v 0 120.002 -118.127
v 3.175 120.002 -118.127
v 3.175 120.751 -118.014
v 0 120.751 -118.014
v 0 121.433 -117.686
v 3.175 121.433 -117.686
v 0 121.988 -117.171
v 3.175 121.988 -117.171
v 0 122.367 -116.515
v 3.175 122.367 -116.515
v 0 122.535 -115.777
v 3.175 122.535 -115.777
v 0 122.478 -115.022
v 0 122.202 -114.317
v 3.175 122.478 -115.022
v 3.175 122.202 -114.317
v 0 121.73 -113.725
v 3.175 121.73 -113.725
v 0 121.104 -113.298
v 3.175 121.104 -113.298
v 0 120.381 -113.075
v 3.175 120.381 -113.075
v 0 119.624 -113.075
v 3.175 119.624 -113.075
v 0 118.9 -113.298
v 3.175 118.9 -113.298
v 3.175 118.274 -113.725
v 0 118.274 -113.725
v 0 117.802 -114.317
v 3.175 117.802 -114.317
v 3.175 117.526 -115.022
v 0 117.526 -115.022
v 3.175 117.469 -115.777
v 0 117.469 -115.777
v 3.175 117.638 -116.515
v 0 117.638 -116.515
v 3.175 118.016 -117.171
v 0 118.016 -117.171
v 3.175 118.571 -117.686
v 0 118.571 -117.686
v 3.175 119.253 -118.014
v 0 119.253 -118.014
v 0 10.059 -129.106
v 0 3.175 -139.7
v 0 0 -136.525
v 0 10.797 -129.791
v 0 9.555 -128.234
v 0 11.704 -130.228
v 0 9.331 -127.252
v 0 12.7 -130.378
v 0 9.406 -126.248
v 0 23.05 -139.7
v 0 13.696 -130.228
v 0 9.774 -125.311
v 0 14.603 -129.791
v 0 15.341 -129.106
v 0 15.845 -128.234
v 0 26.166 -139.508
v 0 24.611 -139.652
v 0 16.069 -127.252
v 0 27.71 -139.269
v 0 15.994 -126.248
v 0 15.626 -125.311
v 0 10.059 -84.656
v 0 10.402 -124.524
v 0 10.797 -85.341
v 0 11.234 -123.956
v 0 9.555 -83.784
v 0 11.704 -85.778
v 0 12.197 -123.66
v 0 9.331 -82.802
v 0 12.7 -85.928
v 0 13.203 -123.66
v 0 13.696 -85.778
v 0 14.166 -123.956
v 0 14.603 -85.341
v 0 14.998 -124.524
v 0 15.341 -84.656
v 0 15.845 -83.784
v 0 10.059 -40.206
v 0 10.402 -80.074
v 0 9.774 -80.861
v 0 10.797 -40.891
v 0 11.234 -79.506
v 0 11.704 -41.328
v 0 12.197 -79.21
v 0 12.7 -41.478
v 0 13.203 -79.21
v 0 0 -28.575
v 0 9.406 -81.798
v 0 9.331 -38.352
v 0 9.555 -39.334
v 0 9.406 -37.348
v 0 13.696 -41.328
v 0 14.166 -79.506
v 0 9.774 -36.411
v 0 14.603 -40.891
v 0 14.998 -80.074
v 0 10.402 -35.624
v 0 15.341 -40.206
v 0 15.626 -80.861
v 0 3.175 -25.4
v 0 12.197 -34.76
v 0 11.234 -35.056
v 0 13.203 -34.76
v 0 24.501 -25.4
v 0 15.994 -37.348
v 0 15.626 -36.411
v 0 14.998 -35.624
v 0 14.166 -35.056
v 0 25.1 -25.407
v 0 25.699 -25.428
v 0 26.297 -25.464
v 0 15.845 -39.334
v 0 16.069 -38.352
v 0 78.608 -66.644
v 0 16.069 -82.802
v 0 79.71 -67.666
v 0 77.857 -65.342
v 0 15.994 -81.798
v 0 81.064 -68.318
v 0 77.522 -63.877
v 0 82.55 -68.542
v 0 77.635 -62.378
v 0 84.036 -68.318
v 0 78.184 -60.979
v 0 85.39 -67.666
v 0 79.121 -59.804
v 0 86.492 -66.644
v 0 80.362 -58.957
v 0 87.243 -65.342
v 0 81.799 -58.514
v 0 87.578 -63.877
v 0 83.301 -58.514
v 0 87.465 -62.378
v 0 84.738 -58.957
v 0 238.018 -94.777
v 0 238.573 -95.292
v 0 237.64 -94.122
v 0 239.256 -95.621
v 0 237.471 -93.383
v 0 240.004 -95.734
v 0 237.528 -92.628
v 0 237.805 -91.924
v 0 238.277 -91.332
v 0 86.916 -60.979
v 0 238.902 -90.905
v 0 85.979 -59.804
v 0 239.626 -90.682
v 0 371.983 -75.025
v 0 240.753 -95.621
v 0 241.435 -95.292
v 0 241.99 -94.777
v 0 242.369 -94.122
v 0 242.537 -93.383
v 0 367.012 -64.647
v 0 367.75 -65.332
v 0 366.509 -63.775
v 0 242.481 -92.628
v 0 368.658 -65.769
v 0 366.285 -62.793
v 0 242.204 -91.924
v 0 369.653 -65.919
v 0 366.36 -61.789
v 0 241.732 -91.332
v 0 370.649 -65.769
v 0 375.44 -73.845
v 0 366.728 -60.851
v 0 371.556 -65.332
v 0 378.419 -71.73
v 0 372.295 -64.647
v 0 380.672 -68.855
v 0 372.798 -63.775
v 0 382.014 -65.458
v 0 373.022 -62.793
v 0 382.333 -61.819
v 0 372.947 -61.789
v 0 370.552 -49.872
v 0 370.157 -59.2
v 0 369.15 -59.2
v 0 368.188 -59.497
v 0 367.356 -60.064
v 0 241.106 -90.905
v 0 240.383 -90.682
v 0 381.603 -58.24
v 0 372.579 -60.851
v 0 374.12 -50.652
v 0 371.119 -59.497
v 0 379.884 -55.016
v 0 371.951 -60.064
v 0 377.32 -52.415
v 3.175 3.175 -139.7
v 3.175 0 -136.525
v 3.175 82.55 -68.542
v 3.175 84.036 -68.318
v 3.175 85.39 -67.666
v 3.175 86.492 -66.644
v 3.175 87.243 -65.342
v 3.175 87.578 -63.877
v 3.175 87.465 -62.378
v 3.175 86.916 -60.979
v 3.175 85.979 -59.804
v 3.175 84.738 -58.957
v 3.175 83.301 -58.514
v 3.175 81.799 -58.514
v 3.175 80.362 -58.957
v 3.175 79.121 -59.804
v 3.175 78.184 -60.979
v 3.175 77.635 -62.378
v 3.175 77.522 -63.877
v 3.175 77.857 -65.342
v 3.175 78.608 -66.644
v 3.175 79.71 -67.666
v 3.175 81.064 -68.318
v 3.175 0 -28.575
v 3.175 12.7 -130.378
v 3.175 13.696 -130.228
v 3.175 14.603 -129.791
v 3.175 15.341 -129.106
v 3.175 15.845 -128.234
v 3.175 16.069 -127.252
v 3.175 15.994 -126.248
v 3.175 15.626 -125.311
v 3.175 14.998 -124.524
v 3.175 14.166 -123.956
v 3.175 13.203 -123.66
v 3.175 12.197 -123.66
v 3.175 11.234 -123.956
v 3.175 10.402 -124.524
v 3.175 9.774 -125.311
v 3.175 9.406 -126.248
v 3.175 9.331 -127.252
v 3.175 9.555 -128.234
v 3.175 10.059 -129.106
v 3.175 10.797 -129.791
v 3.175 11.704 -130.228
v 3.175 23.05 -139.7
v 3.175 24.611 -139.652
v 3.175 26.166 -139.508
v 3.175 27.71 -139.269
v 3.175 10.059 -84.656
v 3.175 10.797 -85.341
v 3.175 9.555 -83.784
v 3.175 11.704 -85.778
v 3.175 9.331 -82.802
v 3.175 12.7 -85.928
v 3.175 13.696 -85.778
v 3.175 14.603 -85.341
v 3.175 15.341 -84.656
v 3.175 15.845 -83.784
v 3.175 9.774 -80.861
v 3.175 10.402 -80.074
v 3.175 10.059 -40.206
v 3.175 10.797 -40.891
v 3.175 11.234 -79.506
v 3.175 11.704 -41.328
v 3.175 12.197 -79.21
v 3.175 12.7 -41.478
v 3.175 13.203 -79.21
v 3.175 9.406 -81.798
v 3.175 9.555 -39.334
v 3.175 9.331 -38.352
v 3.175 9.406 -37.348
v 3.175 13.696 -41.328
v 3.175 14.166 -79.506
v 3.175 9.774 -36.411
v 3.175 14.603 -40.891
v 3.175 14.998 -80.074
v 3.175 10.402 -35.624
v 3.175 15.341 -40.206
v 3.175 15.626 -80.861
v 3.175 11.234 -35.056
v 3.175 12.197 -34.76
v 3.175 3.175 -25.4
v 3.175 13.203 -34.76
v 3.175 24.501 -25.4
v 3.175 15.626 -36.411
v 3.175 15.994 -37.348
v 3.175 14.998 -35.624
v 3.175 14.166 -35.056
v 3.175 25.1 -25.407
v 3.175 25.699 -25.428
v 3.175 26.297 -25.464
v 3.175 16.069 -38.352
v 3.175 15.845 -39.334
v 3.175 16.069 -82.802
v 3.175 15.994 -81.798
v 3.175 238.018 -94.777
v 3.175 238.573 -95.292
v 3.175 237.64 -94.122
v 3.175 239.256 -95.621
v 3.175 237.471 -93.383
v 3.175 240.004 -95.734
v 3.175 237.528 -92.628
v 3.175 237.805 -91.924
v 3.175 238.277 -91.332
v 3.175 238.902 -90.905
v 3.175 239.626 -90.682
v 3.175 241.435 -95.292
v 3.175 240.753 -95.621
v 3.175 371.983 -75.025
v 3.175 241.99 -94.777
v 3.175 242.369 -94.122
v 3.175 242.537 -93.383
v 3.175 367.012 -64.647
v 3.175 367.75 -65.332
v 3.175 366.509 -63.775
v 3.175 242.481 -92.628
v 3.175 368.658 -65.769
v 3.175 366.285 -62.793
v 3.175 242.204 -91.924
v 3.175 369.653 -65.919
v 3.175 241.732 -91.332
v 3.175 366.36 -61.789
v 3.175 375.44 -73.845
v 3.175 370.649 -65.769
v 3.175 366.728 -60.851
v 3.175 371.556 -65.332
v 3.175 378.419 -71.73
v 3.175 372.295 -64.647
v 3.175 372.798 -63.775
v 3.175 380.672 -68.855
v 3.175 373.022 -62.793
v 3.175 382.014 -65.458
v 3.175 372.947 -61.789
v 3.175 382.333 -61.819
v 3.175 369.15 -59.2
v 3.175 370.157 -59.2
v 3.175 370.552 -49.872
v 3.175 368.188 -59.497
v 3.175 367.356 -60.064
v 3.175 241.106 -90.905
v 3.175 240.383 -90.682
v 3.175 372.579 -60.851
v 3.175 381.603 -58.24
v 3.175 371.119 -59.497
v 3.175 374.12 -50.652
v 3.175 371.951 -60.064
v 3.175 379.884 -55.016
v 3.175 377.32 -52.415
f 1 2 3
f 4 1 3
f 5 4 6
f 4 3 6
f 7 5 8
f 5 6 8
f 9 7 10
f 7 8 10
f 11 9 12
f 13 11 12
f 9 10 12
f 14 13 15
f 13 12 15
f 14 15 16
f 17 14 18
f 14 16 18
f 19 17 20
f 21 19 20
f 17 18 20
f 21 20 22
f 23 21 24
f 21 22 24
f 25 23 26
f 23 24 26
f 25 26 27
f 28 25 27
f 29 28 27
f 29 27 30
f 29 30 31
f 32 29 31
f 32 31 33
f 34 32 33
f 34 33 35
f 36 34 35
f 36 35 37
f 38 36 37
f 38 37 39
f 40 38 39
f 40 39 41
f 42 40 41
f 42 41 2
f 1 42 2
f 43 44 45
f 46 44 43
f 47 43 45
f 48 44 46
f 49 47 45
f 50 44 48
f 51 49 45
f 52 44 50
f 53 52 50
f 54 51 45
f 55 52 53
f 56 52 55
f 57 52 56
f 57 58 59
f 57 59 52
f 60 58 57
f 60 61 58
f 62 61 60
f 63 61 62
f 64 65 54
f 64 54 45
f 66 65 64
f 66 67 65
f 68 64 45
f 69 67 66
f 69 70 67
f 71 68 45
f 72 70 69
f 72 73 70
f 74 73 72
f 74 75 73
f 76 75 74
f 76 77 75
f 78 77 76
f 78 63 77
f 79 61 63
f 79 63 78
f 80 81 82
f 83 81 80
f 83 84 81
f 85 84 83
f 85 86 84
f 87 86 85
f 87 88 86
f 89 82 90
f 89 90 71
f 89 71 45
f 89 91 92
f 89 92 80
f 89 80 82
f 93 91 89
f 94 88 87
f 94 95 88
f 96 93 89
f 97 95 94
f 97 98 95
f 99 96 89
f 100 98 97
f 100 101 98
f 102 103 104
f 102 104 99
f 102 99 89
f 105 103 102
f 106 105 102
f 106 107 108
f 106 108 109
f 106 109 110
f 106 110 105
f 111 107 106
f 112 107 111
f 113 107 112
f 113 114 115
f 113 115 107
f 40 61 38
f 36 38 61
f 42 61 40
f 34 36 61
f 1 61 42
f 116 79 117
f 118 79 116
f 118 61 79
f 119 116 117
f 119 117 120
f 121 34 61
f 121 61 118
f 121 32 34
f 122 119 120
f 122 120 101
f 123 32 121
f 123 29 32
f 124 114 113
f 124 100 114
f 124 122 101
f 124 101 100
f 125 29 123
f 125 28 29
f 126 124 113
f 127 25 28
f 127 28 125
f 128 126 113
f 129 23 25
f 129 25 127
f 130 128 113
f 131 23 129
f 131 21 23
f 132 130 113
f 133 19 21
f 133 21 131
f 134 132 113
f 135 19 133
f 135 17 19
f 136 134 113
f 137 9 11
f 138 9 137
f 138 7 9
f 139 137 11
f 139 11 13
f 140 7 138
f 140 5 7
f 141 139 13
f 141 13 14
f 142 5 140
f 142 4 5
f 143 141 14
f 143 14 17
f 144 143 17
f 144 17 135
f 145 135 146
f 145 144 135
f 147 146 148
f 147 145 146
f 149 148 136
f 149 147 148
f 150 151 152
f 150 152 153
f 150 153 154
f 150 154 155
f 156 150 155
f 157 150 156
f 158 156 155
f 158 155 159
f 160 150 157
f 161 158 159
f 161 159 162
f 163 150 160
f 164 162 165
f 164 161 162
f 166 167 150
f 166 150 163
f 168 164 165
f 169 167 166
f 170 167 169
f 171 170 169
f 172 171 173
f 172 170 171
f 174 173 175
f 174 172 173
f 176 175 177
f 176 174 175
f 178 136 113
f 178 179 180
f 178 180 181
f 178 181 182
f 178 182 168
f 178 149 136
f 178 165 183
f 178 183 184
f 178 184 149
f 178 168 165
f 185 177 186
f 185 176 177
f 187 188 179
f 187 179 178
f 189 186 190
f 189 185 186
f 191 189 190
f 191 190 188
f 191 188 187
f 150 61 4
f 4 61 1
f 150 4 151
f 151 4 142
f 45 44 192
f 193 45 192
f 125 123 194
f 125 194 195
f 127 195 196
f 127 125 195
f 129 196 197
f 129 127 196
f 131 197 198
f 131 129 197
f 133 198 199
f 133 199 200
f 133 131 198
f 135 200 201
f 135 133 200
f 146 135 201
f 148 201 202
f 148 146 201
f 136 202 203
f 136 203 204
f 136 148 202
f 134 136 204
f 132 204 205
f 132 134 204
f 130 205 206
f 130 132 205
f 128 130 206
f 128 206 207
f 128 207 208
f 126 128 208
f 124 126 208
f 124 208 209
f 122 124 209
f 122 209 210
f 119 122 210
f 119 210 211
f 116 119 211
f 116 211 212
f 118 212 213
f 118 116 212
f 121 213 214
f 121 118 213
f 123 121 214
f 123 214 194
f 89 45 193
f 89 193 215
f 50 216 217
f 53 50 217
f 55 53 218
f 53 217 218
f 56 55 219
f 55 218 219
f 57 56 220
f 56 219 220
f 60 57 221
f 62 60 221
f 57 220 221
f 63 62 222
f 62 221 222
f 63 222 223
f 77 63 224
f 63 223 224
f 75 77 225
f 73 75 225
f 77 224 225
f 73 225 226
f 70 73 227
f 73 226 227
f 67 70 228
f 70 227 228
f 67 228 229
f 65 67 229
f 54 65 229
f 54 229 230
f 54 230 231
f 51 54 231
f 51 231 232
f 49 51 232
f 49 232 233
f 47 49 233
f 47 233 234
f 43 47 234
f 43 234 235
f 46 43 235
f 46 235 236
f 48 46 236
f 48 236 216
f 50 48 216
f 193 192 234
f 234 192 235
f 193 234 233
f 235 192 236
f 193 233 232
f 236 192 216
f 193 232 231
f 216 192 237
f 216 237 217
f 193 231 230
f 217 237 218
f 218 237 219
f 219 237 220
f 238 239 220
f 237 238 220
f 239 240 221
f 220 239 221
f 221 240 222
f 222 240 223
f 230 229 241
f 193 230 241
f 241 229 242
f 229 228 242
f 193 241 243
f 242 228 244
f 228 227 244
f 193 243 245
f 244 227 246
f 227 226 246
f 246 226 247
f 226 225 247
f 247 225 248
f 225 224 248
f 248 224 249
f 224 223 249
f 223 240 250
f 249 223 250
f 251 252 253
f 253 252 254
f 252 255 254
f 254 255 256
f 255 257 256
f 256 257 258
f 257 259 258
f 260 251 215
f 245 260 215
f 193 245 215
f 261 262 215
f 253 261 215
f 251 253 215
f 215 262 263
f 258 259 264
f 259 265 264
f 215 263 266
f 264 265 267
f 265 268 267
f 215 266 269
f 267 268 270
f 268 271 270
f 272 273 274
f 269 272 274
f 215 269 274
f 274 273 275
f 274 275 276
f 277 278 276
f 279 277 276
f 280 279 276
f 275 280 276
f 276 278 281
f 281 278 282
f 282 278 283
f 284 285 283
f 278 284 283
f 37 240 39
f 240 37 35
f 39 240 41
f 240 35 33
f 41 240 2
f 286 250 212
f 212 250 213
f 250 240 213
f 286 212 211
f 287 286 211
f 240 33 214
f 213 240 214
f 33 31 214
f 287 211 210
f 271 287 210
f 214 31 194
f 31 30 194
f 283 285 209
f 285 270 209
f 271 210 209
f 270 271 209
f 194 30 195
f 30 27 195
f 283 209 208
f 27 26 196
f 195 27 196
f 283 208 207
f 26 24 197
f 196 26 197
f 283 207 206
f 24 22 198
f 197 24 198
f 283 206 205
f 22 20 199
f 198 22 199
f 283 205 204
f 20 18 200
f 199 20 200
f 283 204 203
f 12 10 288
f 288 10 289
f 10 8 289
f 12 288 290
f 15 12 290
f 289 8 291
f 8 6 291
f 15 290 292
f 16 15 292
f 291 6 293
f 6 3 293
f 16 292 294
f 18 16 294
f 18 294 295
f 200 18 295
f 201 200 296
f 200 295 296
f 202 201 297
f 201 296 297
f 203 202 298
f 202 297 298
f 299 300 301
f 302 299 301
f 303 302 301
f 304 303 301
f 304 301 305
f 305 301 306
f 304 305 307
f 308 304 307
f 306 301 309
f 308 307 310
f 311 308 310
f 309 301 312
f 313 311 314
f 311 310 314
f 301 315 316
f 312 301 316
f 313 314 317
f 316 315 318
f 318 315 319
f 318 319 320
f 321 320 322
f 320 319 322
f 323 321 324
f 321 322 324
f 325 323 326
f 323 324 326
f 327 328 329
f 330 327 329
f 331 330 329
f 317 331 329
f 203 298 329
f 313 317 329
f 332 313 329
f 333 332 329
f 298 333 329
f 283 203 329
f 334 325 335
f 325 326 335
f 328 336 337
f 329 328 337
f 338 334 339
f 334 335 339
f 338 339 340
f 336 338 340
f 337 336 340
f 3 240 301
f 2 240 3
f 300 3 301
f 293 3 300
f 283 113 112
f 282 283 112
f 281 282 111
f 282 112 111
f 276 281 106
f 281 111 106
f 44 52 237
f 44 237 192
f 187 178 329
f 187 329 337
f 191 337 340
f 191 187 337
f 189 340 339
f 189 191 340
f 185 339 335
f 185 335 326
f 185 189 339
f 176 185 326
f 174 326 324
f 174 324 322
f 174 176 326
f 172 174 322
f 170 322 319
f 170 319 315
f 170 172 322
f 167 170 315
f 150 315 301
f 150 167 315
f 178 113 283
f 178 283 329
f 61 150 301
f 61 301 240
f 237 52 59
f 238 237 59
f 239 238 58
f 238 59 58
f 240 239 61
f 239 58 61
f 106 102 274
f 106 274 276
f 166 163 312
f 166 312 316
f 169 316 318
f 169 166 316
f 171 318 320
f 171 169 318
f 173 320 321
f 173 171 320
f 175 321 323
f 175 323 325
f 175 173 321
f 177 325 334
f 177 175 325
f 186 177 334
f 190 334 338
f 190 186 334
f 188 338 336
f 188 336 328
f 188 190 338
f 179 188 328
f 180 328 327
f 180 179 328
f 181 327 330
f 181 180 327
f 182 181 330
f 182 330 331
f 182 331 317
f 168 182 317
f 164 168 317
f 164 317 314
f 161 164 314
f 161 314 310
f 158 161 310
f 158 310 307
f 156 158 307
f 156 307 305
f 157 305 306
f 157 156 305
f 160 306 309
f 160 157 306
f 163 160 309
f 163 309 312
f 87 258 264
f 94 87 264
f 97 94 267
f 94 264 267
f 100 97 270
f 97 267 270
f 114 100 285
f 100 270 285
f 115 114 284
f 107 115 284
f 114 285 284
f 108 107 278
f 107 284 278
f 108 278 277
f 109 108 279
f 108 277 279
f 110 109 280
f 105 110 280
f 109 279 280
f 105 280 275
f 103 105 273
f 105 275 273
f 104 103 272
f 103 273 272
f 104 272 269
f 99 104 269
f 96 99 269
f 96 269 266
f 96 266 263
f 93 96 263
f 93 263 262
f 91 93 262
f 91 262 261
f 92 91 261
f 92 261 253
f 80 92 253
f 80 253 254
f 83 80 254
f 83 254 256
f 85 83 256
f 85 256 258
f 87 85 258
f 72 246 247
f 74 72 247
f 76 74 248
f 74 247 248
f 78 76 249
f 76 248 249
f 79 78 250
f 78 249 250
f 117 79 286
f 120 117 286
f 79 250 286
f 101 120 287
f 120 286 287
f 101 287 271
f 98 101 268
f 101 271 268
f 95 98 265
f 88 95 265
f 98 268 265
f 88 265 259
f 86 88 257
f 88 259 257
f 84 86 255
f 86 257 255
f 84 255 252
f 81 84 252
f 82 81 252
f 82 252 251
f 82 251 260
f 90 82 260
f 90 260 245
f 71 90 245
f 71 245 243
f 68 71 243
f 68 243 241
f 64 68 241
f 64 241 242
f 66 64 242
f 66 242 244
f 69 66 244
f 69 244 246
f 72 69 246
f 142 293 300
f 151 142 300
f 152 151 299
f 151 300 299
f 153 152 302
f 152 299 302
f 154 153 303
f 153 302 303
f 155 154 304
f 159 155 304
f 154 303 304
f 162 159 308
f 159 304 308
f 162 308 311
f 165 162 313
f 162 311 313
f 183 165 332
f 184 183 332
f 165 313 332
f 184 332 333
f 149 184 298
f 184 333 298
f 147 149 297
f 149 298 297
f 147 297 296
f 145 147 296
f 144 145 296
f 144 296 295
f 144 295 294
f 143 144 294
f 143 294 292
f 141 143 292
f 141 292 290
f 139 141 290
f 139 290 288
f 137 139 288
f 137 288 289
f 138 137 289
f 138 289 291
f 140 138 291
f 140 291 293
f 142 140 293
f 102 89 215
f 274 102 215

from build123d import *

# Parameters (mm, degrees)
SKETCH2_R           = 5.0419
SKETCH2_R_2         = 3.3782
BOSS_EXTRUDE2_DEPTH = 3.175
SKETCH3_R           = 3.3782
SKETCH3_R_2         = 2.54
CUT_EXTRUDE1_DEPTH  = 408.087553815
CHAMFER1_SIZE       = 3.175
FILLET1_R           = 25.4


with BuildPart() as part:
    # Sketch2 → Boss-Extrude2 (new body)
    with BuildSketch(Plane(origin=(0, 0, 0), x_dir=(0, 0, -1), z_dir=(1, 0, 0))):
        with BuildLine():
            Line((25.4, 0), (25.4, 25.4))
            Line((25.4, 25.4), (49.872202827, 370.551588468))
            ThreePointArc((49.872202827, 370.551588468), (61.818783569, 382.33286047), (75.02488963, 371.98308153))
            Line((75.02488963, 371.98308153), (139.7, 25.4))
            Line((139.7, 25.4), (139.7, 0))
            Line((139.7, 0), (25.4, 0))
        make_face()
        with Locations((63.5, 82.55)):
            Circle(SKETCH2_R, mode=Mode.SUBTRACT)
        with Locations((62.540399951, 369.653378233)):
            Circle(SKETCH2_R_2, mode=Mode.SUBTRACT)
    extrude(amount=BOSS_EXTRUDE2_DEPTH)

    # Sketch3 → Cut-Extrude1 (cut, through all)
    with BuildSketch(Plane(origin=(3.175, 0, 0), x_dir=(0, 0, -1), z_dir=(1, 0, 0))):
        with Locations((38.1, 12.7)):
            Circle(SKETCH3_R)
        with Locations((82.55, 12.7)):
            Circle(SKETCH3_R)
        with Locations((127, 12.7)):
            Circle(SKETCH3_R)
        with Locations((93.193559072, 240.004229778)):
            Circle(SKETCH3_R_2)
        with Locations((115.586891115, 120.002114889)):
            Circle(SKETCH3_R_2)
    extrude(amount=-CUT_EXTRUDE1_DEPTH, mode=Mode.SUBTRACT)

    # Chamfer1
    chamfer1_edges = [part.edges().sort_by_distance(p)[0] for p in [
        (1.5875, 0, -25.4),
        (1.5875, 0, -139.7),
    ]]
    chamfer(chamfer1_edges, length=CHAMFER1_SIZE)

    # Fillet1
    # the kernel refuses this fillet: 25.4 mm, written as the material it takes off along each edge
    with BuildSketch(Plane(origin=(-2.248340694, 25.4, -25.4), x_dir=(0, -1, 0), z_dir=(1, 0, 0))) as fillet1_piece_1:
        with BuildLine():
            CenterArc((FILLET1_R * 0.0354069400697, FILLET1_R), FILLET1_R, 265.944357758, 4.055642242)
            Line((-FILLET1_R * 0.0353182753041, FILLET1_R * 0.00250416346216), (0, 0))
            Line((0, 0), (FILLET1_R * 0.0354069400697, 0))
        make_face()
    extrude(amount=7.671681389, mode=Mode.SUBTRACT)
    with BuildSketch(Plane(origin=(-5.874097958, 25.4, -139.7), x_dir=(0, 0.9830306833875174, 0.1834412045279636), z_dir=(1, 0, 0))) as fillet1_piece_2:
        with BuildLine():
            CenterArc((FILLET1_R * 0.0925054796503, FILLET1_R), FILLET1_R, 259.429735221, 10.570264779)
            Line((-FILLET1_R * 0.0909357248777, FILLET1_R * 0.0169693166125), (0, 0))
            Line((0, 0), (FILLET1_R * 0.0925054796503, 0))
        make_face()
    extrude(amount=14.923195916, mode=Mode.SUBTRACT)


solid = part.part
